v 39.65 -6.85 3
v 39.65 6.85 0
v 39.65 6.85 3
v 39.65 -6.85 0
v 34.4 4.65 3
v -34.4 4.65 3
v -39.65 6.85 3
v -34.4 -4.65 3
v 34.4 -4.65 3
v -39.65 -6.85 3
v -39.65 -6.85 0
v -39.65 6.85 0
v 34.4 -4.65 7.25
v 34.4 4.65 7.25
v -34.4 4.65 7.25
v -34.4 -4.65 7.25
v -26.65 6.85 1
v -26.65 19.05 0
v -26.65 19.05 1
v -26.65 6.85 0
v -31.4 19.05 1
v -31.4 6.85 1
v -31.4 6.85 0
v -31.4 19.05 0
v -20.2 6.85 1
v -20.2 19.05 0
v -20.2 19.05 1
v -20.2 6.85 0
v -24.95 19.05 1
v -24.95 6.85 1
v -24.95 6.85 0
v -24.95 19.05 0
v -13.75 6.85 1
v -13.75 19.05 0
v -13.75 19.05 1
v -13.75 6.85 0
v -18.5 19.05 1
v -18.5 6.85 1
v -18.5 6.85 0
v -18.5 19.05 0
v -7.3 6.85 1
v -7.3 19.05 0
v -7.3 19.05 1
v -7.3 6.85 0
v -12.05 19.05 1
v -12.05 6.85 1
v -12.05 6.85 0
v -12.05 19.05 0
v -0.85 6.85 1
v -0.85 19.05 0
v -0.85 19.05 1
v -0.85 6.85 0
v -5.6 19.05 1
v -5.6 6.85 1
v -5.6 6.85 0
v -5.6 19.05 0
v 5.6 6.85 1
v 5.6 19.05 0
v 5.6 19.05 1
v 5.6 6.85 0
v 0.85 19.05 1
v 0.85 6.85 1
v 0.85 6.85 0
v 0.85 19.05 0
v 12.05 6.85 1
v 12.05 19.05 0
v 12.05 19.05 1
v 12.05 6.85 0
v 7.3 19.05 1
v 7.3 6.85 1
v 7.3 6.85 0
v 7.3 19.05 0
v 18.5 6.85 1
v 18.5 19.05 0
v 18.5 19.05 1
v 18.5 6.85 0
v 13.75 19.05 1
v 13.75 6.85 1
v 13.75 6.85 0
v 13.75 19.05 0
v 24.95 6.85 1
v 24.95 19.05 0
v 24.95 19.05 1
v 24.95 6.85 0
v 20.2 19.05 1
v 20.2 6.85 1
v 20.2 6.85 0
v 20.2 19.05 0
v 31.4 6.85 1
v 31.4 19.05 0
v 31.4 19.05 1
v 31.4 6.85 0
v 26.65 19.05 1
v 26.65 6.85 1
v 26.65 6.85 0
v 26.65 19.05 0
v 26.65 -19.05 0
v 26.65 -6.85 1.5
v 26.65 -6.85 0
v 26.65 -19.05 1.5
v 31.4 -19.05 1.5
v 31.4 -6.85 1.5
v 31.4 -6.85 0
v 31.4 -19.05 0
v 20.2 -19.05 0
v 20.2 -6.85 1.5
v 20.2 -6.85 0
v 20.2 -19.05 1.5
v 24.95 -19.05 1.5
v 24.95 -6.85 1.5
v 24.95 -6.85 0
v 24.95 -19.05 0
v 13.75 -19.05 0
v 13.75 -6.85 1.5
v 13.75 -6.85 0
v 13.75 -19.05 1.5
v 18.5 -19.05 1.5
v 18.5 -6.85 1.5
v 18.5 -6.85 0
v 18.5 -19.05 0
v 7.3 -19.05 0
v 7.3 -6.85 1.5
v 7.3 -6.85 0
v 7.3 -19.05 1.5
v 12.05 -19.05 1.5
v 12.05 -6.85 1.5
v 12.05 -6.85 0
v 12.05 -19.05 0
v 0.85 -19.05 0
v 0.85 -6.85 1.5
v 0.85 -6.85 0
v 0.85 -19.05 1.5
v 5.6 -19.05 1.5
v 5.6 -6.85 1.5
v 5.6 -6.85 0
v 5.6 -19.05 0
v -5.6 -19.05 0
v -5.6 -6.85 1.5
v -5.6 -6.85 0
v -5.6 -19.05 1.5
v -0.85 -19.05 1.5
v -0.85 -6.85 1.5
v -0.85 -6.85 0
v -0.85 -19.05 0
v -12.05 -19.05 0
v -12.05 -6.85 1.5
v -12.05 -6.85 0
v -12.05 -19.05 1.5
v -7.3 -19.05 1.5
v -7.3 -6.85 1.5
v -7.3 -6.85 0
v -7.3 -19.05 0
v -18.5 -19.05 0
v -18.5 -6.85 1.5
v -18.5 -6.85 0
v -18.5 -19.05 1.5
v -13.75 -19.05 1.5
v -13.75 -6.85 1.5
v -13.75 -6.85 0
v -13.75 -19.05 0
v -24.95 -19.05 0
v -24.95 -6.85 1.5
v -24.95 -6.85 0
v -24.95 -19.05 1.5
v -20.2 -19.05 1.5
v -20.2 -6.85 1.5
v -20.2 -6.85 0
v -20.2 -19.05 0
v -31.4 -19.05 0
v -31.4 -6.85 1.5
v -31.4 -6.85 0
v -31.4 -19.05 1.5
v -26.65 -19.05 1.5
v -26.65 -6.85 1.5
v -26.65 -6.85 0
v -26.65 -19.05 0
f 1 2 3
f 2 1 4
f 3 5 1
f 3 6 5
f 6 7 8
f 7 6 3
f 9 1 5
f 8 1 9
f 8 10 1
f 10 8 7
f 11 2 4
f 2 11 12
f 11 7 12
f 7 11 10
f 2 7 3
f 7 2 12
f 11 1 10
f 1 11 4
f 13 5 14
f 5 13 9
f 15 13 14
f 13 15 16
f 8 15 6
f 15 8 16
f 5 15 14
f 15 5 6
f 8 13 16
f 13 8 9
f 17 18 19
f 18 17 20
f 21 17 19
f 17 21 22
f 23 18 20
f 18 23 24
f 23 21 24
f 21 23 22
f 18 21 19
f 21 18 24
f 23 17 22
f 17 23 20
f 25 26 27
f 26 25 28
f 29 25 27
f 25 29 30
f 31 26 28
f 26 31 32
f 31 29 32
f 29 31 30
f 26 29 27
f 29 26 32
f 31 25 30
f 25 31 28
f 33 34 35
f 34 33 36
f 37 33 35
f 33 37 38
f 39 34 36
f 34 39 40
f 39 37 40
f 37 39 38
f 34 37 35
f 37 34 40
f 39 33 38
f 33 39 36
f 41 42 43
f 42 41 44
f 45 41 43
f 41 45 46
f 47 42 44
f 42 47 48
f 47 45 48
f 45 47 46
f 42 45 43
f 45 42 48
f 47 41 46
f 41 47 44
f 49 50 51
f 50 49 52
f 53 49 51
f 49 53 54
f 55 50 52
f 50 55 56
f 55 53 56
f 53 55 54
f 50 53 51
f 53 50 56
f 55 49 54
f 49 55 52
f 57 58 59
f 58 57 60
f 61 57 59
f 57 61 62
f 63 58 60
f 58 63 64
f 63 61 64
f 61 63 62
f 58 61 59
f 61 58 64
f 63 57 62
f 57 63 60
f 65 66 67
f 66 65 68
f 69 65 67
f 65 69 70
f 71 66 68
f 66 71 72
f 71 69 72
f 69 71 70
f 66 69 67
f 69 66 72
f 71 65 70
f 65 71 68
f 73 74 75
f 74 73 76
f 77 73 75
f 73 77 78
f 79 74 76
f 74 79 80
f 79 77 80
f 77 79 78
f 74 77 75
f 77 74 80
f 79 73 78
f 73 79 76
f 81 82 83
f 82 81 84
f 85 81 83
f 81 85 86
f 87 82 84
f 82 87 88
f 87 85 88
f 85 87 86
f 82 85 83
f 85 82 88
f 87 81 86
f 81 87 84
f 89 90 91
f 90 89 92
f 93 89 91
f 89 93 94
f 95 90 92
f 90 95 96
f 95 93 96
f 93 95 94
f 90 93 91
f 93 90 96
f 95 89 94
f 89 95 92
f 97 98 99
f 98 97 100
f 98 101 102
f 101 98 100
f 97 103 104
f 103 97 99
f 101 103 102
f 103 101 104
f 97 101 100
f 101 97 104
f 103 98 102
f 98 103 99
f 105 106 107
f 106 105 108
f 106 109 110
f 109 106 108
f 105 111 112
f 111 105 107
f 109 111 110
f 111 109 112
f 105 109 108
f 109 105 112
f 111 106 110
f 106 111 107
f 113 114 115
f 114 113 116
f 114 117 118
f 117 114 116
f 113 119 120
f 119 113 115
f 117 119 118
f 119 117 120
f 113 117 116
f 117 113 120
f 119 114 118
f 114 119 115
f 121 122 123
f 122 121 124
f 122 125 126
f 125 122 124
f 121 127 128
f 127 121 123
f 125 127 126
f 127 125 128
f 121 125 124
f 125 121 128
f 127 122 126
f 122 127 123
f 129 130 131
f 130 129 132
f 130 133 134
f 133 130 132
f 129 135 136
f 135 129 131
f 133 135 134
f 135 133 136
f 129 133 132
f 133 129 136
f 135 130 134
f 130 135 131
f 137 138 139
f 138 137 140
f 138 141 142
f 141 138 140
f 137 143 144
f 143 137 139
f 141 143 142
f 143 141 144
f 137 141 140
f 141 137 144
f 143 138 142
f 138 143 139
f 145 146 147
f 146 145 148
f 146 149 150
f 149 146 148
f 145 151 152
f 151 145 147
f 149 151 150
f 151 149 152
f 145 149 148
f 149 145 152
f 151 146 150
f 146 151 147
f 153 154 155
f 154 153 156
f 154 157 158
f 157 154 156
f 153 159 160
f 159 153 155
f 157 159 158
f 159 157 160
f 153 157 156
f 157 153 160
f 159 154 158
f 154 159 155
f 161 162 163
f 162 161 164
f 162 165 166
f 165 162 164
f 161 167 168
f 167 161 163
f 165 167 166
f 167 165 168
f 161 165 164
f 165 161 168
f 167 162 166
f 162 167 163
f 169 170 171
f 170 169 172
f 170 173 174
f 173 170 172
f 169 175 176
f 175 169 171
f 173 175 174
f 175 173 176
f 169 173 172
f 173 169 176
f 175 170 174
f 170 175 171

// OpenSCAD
/* [Teeth] */

// Width reserved on either end of comb to be free of teeth.
tooth_margin = 8.25;

// Spacing between teeth.
tooth_gap = 1.7;

// Number of teeth. Tooth width is calculated from tooth count, gap, and available space.
tooth_count = 10;

// Length of teeth (measured perpendicular from comb 
tooth_length = 12.2;

front_tooth_height = 1.5;

rear_tooth_height = 1.0;

/* [Core] */

// Width of lower section of comb core.
comb_x = 79.3;

// Length (narrow dimension) or lower section of comb core, not counting teeth.
comb_y = 13.7;

// Height of lower section of comb core (from base).
comb_z = 3.0;

// Width of raised section of comb core (centered in lower section).
raised_x = 68.8;

// Length (narrow dimension) of raised section of comb core (centered in lower section).
raised_y = 9.3;

// Height of raised section of comb core (from base).
raised_z = 7.25;

/* [Hidden] */

// Width available for teeth (comb width minus margins).
tooth_span = comb_x - (2 * tooth_margin);

// Individual tooth width (maximum to fill span with count teeth with gap betwen each).
tooth_width = (tooth_span - (tooth_count - 1) * tooth_gap) / tooth_count;

echo(tooth_width);

union() {
	Core();
	Teeth(rear_tooth_height);
	rotate([0, 0, 180]) Teeth(front_tooth_height);
}

module Core() {
	union() {
		translate([0, 0, comb_z/2]) cube([comb_x, comb_y, comb_z], center=true);
		translate([0, 0, raised_z/2]) cube([raised_x, raised_y, raised_z], center=true);
	}
}

module Teeth(height) {
	translate([-tooth_span/2 + tooth_width/2, comb_y/2, 0]) union() {
		for(i = [0:tooth_count-1]) {
			translate([i * (tooth_width + tooth_gap), 0, 0]) Tooth(tooth_width, tooth_length, height);
		}
	}
}

module Tooth(width, length, height) {
	translate([0, length/2, height/2]) cube([width, length, height], center=true);
}
